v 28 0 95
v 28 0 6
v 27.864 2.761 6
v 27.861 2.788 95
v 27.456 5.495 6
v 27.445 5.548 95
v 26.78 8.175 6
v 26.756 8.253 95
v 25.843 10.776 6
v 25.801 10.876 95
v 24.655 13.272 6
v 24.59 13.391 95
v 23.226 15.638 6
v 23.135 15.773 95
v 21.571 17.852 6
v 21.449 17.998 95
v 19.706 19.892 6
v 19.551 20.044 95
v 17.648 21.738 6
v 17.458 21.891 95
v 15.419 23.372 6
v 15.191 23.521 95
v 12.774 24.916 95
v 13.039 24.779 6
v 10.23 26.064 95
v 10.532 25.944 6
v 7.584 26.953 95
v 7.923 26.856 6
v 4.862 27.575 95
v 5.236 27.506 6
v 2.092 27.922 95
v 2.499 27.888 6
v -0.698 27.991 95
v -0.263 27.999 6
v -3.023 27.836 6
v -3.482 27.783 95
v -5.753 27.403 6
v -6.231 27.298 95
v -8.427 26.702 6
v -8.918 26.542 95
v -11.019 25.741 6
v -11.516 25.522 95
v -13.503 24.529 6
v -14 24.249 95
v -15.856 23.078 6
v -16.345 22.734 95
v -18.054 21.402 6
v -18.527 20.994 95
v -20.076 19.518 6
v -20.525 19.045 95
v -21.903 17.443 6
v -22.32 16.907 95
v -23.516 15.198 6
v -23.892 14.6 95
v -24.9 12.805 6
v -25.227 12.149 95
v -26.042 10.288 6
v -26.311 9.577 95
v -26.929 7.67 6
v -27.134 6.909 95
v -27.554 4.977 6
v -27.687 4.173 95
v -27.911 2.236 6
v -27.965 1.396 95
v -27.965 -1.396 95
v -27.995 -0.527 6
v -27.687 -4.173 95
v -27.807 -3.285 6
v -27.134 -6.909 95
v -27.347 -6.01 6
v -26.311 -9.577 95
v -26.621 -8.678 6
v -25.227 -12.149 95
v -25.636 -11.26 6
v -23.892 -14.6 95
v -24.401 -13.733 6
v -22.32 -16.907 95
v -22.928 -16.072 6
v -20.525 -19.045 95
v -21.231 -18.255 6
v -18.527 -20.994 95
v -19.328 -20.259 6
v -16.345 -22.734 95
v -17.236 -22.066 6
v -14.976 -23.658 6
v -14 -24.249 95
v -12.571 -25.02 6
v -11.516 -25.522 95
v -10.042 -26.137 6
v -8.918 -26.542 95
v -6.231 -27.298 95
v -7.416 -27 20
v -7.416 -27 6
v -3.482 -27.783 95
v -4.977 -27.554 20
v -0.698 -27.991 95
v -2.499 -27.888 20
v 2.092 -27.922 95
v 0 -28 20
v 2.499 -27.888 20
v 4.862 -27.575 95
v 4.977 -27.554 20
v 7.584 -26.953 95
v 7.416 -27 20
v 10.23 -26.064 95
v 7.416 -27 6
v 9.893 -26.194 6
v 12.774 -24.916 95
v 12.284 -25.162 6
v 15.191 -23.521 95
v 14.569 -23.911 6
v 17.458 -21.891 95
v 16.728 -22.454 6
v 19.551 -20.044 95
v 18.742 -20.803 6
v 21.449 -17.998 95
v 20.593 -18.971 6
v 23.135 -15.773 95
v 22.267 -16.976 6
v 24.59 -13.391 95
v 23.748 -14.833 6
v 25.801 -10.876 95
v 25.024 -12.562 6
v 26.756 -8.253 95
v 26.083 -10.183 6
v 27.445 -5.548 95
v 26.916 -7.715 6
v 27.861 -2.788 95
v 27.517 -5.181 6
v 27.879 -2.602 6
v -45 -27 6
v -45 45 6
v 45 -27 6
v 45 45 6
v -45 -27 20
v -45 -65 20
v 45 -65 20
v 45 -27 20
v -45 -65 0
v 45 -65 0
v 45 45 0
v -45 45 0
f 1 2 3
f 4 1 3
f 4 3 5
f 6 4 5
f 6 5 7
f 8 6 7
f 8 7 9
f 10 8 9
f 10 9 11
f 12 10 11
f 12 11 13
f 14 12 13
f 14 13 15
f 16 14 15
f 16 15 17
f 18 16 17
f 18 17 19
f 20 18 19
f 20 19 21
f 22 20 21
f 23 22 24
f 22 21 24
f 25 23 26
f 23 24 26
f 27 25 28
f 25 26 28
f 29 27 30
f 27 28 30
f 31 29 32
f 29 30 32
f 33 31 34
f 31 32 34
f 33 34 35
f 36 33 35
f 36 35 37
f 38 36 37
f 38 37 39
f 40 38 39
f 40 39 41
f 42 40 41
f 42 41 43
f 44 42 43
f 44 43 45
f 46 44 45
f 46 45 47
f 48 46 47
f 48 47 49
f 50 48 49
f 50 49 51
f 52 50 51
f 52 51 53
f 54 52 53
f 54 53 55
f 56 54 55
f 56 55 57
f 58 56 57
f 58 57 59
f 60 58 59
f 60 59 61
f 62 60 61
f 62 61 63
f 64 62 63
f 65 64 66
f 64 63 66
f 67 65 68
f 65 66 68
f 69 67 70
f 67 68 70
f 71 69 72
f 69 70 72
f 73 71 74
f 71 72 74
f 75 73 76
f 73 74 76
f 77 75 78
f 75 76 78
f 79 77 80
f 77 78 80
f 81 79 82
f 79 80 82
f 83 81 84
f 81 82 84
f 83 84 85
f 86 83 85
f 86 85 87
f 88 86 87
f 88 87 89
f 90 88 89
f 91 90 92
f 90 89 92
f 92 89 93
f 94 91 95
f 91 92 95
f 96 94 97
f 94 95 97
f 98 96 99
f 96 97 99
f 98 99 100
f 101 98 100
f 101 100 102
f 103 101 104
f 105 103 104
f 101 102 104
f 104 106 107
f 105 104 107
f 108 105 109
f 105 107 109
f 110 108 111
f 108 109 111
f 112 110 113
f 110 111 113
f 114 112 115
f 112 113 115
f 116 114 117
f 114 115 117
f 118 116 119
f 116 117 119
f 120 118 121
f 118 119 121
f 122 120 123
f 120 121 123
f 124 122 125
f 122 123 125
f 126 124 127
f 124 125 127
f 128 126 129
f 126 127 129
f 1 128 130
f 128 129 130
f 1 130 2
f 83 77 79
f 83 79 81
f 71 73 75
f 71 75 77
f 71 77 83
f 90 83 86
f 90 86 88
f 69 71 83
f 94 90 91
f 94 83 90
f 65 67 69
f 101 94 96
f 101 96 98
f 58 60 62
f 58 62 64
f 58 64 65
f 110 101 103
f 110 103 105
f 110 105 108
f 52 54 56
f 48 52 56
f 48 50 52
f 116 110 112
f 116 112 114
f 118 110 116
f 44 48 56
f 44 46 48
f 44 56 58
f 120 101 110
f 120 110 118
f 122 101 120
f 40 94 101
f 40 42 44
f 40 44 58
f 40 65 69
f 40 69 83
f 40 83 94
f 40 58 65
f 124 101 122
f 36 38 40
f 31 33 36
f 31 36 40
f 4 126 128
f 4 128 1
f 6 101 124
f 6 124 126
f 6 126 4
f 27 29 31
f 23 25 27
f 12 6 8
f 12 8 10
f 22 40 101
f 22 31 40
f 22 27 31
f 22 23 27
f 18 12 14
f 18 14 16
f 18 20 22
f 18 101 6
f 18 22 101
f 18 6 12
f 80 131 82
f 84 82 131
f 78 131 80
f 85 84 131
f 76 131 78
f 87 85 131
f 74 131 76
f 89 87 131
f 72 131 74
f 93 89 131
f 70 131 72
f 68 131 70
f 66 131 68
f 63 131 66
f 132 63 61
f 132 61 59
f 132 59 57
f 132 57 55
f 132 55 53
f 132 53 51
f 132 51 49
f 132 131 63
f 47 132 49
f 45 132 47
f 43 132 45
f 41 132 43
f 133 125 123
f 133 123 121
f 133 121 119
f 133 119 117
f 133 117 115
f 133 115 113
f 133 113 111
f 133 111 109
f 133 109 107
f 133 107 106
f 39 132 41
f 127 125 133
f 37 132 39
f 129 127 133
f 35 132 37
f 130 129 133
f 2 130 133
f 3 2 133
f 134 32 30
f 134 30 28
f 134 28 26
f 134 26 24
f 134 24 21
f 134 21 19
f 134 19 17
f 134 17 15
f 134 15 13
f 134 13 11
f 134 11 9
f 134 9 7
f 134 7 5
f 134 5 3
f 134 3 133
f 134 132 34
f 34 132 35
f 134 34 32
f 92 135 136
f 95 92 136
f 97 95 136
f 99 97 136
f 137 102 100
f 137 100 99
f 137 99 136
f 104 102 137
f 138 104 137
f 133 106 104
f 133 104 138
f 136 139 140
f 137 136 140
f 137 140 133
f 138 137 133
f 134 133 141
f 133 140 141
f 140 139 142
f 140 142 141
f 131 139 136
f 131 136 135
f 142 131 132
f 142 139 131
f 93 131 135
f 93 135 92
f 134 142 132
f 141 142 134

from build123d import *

# Parameters (mm, degrees)
SKETCH_1_W      = 90
SKETCH_1_H      = 90
EXTRUDE_1_DEPTH = 6
SKETCH_2_R      = 28
EXTRUDE_2_DEPTH = 95
SKETCH_3_W      = 90
SKETCH_3_H      = 38
EXTRUDE_3_DEPTH = 20


with BuildPart() as part:
    # 草图1 → 凸台-拉伸1 (new body)
    with BuildSketch(Plane.XY):
        Rectangle(SKETCH_1_W, SKETCH_1_H)
    extrude(amount=EXTRUDE_1_DEPTH)

    # 草图2 → 凸台-拉伸2 (add)
    with BuildSketch(Plane.XY):
        Circle(SKETCH_2_R)
    extrude(amount=EXTRUDE_2_DEPTH)

    # 草图3 → 凸台-拉伸3 (add)
    with BuildSketch(Plane.XY):
        with Locations((0, -46)):
            Rectangle(SKETCH_3_W, SKETCH_3_H)
    extrude(amount=EXTRUDE_3_DEPTH)


solid = part.part
